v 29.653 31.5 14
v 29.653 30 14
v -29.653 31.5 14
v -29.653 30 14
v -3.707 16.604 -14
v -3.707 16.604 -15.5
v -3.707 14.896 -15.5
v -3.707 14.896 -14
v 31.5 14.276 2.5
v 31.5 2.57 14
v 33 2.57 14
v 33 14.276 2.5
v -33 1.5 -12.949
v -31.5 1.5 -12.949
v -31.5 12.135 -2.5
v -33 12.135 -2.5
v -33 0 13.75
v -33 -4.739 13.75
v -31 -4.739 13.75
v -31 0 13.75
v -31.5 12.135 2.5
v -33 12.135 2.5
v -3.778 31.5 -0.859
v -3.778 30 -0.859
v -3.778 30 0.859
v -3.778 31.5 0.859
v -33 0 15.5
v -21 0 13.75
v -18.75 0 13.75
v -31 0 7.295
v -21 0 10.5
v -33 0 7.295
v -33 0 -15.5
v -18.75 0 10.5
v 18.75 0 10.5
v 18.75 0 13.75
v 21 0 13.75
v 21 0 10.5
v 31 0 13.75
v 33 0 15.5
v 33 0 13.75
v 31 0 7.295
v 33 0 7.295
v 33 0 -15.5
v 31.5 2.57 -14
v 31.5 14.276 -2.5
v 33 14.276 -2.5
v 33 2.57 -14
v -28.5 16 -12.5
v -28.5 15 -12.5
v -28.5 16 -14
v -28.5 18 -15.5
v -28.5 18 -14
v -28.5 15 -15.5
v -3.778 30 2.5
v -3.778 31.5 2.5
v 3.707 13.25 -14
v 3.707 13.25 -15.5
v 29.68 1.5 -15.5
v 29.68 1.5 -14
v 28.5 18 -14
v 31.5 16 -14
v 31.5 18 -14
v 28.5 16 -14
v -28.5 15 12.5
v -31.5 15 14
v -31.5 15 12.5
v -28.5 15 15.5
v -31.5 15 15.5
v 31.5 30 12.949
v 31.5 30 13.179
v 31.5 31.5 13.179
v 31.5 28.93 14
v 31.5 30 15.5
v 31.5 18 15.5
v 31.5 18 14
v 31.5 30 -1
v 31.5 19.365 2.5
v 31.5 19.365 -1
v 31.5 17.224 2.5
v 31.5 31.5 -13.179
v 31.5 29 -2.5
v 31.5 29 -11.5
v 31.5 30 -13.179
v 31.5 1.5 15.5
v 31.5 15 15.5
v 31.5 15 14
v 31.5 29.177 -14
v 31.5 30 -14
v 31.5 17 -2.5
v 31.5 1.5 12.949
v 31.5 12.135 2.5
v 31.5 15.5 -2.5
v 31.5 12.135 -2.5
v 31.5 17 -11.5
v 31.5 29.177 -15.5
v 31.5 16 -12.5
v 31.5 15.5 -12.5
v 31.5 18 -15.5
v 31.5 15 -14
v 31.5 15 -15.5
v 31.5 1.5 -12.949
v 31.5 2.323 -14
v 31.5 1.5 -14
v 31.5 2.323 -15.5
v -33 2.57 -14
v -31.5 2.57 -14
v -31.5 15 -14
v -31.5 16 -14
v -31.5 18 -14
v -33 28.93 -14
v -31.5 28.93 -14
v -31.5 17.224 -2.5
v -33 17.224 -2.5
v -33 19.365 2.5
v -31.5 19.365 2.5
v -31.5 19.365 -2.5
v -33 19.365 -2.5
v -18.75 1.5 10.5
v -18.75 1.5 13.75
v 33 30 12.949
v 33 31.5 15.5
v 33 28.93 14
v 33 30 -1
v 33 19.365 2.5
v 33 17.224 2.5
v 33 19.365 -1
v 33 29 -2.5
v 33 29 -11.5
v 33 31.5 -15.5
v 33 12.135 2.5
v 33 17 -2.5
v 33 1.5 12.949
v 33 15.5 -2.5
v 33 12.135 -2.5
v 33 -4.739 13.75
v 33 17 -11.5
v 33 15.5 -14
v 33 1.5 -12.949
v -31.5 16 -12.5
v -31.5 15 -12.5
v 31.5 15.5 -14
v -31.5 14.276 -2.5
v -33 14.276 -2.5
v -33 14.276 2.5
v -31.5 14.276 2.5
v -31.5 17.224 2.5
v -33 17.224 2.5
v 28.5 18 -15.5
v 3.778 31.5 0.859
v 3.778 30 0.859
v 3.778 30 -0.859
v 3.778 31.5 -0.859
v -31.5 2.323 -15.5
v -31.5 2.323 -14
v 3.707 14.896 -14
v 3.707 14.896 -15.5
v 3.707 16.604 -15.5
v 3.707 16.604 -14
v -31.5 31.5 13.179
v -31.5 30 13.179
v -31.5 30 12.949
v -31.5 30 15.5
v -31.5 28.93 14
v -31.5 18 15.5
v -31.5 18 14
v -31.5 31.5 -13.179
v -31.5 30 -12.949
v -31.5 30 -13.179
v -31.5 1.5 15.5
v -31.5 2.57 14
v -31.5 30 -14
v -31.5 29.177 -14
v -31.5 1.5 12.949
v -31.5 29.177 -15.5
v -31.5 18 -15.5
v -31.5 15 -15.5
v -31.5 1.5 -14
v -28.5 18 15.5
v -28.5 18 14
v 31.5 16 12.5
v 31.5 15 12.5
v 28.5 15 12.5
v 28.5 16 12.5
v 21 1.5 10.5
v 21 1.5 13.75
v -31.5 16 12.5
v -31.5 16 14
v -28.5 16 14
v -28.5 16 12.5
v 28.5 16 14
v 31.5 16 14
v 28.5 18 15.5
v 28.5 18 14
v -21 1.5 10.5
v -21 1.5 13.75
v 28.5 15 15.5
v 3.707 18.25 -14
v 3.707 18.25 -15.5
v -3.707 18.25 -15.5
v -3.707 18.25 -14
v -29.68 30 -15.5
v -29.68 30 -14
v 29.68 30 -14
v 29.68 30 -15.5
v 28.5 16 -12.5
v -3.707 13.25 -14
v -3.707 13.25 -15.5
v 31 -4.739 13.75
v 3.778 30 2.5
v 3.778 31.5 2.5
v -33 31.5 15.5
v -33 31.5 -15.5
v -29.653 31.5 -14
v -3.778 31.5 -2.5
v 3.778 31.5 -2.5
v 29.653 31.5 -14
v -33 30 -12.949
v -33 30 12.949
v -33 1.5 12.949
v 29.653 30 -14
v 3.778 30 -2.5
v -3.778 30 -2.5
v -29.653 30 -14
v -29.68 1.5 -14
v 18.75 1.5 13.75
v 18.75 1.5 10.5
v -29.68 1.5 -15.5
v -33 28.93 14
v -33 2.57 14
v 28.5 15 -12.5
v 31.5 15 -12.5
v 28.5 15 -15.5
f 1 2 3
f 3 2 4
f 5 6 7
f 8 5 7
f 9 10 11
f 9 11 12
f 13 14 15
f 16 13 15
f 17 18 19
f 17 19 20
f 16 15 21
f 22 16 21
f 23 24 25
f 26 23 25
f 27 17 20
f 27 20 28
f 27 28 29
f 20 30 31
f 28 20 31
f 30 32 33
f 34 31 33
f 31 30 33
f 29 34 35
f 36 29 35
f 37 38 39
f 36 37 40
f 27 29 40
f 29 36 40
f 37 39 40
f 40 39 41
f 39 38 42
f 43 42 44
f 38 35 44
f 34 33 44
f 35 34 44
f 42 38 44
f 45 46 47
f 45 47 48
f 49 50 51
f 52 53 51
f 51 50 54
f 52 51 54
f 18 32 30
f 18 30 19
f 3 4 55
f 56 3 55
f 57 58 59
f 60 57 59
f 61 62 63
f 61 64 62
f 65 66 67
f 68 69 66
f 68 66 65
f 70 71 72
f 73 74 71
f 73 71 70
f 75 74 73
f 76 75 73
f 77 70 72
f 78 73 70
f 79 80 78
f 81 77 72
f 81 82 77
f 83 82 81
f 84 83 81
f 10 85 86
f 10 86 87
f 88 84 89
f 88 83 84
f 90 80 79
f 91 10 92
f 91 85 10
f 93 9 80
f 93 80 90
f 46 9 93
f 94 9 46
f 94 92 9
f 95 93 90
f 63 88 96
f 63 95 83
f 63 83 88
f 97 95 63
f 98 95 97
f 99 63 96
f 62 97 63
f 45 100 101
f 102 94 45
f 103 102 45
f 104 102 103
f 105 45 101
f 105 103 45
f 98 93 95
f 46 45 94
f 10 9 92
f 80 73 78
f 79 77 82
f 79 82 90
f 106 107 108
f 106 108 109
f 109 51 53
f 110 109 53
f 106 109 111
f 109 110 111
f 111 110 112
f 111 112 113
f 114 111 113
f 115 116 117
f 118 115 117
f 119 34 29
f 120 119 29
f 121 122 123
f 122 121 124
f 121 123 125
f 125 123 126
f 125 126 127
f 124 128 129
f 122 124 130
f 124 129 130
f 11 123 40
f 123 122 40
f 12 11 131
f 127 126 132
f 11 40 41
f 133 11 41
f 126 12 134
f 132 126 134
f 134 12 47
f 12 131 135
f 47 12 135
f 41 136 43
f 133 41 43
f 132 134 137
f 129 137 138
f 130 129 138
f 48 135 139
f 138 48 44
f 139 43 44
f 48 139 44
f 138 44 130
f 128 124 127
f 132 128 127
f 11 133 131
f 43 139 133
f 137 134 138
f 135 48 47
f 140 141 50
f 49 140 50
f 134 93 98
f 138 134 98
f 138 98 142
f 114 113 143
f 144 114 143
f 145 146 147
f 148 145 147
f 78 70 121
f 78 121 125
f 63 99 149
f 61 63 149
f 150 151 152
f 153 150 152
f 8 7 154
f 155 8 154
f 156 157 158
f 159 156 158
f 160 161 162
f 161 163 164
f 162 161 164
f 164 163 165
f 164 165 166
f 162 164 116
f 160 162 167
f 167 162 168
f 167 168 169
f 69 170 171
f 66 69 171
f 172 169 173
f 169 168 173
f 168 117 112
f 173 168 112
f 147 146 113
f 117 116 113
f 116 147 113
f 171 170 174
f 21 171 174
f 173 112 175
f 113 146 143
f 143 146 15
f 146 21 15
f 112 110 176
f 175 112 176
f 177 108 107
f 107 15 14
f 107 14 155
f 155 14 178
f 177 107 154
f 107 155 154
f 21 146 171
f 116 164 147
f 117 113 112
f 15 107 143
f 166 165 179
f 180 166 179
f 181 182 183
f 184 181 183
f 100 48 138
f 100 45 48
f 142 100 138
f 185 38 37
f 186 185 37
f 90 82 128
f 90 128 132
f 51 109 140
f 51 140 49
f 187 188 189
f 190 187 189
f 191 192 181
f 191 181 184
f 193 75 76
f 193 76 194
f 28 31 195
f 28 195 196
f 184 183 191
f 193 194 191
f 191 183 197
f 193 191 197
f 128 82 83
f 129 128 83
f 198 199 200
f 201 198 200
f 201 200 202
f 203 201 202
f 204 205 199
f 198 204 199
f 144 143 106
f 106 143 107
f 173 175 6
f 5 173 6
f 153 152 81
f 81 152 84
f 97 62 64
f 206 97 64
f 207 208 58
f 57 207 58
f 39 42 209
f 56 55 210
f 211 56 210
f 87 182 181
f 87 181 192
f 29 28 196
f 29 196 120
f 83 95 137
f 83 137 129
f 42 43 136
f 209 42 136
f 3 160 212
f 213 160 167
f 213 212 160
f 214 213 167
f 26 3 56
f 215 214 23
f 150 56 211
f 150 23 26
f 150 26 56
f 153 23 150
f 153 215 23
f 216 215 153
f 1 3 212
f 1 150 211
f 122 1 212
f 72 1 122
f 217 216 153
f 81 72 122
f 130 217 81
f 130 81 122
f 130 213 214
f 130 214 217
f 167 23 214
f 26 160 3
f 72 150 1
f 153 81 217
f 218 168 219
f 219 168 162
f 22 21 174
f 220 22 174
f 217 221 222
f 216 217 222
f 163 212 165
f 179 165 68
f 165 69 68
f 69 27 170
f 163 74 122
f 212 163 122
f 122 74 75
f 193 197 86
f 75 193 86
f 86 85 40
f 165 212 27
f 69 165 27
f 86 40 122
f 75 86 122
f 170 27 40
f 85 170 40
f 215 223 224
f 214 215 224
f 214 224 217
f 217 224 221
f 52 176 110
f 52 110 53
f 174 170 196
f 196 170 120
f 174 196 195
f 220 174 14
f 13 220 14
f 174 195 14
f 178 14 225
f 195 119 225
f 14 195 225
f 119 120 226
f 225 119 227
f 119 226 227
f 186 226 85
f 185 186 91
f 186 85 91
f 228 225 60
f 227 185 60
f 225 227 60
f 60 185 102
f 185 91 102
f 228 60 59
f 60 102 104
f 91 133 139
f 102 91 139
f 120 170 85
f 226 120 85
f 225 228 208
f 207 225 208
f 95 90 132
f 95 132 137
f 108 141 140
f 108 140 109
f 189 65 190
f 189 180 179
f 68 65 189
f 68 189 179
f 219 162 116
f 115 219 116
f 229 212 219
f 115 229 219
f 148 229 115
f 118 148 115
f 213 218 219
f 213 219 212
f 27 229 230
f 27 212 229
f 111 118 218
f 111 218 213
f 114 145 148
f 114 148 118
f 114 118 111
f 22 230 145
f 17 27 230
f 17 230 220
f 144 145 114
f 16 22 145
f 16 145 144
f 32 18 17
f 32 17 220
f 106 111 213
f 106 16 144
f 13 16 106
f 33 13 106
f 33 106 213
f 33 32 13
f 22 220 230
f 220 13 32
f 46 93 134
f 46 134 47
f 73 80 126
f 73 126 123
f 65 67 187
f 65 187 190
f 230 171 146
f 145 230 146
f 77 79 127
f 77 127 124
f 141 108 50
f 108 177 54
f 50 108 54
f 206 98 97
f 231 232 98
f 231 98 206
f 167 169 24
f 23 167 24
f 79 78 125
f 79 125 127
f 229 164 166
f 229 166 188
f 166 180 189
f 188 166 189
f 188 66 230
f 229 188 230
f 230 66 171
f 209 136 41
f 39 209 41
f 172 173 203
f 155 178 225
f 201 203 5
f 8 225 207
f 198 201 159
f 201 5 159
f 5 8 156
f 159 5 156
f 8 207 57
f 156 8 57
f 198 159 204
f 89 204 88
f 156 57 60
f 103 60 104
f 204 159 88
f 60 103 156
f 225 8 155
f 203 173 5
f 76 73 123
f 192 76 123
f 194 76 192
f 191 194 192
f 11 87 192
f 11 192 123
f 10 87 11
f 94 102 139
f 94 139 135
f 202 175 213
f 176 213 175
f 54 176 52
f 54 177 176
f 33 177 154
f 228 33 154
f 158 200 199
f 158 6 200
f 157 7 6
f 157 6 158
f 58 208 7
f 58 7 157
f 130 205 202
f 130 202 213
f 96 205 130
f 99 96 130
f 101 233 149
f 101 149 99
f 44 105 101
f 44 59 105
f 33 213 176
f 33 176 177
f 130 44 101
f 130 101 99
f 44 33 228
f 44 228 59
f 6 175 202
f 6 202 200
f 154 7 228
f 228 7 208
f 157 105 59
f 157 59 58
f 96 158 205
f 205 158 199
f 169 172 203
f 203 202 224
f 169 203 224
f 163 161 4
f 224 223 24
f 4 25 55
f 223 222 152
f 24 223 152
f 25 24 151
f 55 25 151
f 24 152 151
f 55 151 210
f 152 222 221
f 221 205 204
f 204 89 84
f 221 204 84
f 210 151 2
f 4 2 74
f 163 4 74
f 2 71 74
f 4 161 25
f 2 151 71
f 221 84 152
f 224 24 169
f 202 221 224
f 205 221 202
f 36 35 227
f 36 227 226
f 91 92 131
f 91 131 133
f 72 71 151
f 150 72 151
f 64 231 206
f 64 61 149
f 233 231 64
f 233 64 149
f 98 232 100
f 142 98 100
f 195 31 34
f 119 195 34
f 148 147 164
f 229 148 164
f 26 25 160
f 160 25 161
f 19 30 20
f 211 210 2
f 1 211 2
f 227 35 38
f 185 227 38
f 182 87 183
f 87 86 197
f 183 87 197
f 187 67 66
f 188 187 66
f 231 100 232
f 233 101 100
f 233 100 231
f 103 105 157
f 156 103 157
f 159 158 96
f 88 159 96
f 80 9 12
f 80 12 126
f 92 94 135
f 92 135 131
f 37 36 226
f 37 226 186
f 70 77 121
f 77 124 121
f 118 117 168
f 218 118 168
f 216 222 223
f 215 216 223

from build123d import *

# Parameters (mm, degrees)
SKETCH1_W                      = 66
SKETCH1_H                      = 31
BOSS_EXTRUDE1_DEPTH            = 31.5
SHELL1_T                       = -1.5
CUT_EXTRUDE1_REACH             = 57.157
CUT_EXTRUDE2_REACH             = 75.435
CUT_EXTRUDE2_DIRECTION_2_REACH = 75.435
SKETCH6_W                      = 3
SKETCH6_H                      = 1.5
BOSS_EXTRUDE4_DEPTH            = 3
SKETCH6_3_W                    = 3
SKETCH6_3_H                    = 1.5
BOSS_EXTRUDE5_DEPTH            = 1
MIRROR3_COPY_1_SKETCH_W        = 3
MIRROR3_COPY_1_SKETCH_H        = 1.5
MIRROR3_COPY_1_DEPTH           = 3
MIRROR3_COPY_2_SKETCH_W        = 3
MIRROR3_COPY_2_SKETCH_H        = 1.5
MIRROR3_COPY_2_DEPTH           = 1
SKETCH7_W                      = 13
SKETCH7_H                      = 14.5
SKETCH7_W_2                    = 9
SKETCH7_H_2                    = 12
BOSS_EXTRUDE8_DEPTH            = 1.5
SKETCH7_4_W                    = 9
SKETCH7_4_H                    = 12
CUT_EXTRUDE5_DEPTH             = 1.5
CUT_EXTRUDE9_REACH             = 49.215
BOSS_EXTRUDE9_DEPTH            = 2
SKETCH12_W                     = 2.25
SKETCH12_H                     = 3.25
CUT_EXTRUDE10_DEPTH            = 1.5


with BuildPart() as part:
    # Sketch1 → Boss-Extrude1 (new body)
    with BuildSketch(Plane(origin=(0, 0, 0), x_dir=(1, 0, 0), z_dir=(0, 1, 0))):
        Rectangle(SKETCH1_W, SKETCH1_H)
    extrude(amount=BOSS_EXTRUDE1_DEPTH)

    # Shell1
    shell1_openings = [part.faces().sort_by_distance(p)[0] for p in [
        (0, 15.75, 15.5),
    ]]
    offset(amount=SHELL1_T, openings=shell1_openings, kind=Kind.INTERSECTION)

    # Sketch3 → Cut-Extrude1 (cut, up to next)
    with BuildSketch(Plane(origin=(0, 0, -15.5), x_dir=(-1, 0, 0), z_dir=(0, 0, -1)), mode=Mode.PRIVATE) as cut_extrude1_sk1:
        Polygon((29.680353068, 1.5), (3.706668857, 13.25), (-3.706668857, 13.25), (-29.680353068, 1.5), align=None)
    cut_extrude1_tool1 = extrude(cut_extrude1_sk1.sketch, amount=-CUT_EXTRUDE1_REACH, mode=Mode.PRIVATE) & part.part
    # Sketch3 → Cut-Extrude1 (cut, up to next)
    with BuildSketch(Plane(origin=(0, 0, -15.5), x_dir=(-1, 0, 0), z_dir=(0, 0, -1)), mode=Mode.PRIVATE) as cut_extrude1_sk2:
        Polygon((3.706668857, 16.603652775), (3.706668857, 14.896347225), (31.5, 2.323173612), (31.5, 29.176826388), align=None)
    cut_extrude1_tool2 = extrude(cut_extrude1_sk2.sketch, amount=-CUT_EXTRUDE1_REACH, mode=Mode.PRIVATE) & part.part
    # Sketch3 → Cut-Extrude1 (cut, up to next)
    with BuildSketch(Plane(origin=(0, 0, -15.5), x_dir=(-1, 0, 0), z_dir=(0, 0, -1)), mode=Mode.PRIVATE) as cut_extrude1_sk3:
        Polygon((-31.5, 2.323173612), (-3.706668857, 14.896347225), (-3.706668857, 16.603652775), (-31.5, 29.176826388), align=None)
    cut_extrude1_tool3 = extrude(cut_extrude1_sk3.sketch, amount=-CUT_EXTRUDE1_REACH, mode=Mode.PRIVATE) & part.part
    # Sketch3 → Cut-Extrude1 (cut, up to next)
    with BuildSketch(Plane(origin=(0, 0, -15.5), x_dir=(-1, 0, 0), z_dir=(0, 0, -1)), mode=Mode.PRIVATE) as cut_extrude1_sk4:
        Polygon((-3.706668857, 18.25), (3.706668857, 18.25), (29.680353068, 30), (-29.680353068, 30), align=None)
    cut_extrude1_tool4 = extrude(cut_extrude1_sk4.sketch, amount=-CUT_EXTRUDE1_REACH, mode=Mode.PRIVATE) & part.part
    add(cut_extrude1_tool1.solids().sort_by_distance((0, 5.8515, -15.5))[0], mode=Mode.SUBTRACT)
    add(cut_extrude1_tool2.solids().sort_by_distance((-21.68175, 15.75, -15.5))[0], mode=Mode.SUBTRACT)
    add(cut_extrude1_tool3.solids().sort_by_distance((21.68175, 15.75, -15.5))[0], mode=Mode.SUBTRACT)
    add(cut_extrude1_tool4.solids().sort_by_distance((0, 25.6485, -15.5))[0], mode=Mode.SUBTRACT)

    # Sketch4 → Cut-Extrude2 (cut, up to next)
    with BuildSketch(Plane(origin=(-31.5, 0, 0), x_dir=(0, 0, -1), z_dir=(1, 0, 0)), mode=Mode.PRIVATE) as cut_extrude2_sk1:
        Polygon((-2.5, 17.224470603), (-14, 28.929827745), (-14, 2.570172255), (-2.5, 14.275529397), align=None)
    cut_extrude2_tool1 = extrude(cut_extrude2_sk1.sketch, amount=-CUT_EXTRUDE2_REACH, mode=Mode.PRIVATE) & part.part
    # Sketch4 → Cut-Extrude2 (cut, up to next)
    with BuildSketch(Plane(origin=(-31.5, 0, 0), x_dir=(0, 0, -1), z_dir=(1, 0, 0)), mode=Mode.PRIVATE) as cut_extrude2_sk2:
        Polygon((12.948602697, 30), (-12.948602697, 30), (-2.5, 19.364815112), (2.5, 19.364815112), align=None)
    cut_extrude2_tool2 = extrude(cut_extrude2_sk2.sketch, amount=-CUT_EXTRUDE2_REACH, mode=Mode.PRIVATE) & part.part
    # Sketch4 → Cut-Extrude2 (cut, up to next)
    with BuildSketch(Plane(origin=(-31.5, 0, 0), x_dir=(0, 0, -1), z_dir=(1, 0, 0)), mode=Mode.PRIVATE) as cut_extrude2_sk3:
        Polygon((-2.5, 12.135184888), (-12.948602697, 1.5), (12.948602697, 1.5), (2.5, 12.135184888), align=None)
    cut_extrude2_tool3 = extrude(cut_extrude2_sk3.sketch, amount=-CUT_EXTRUDE2_REACH, mode=Mode.PRIVATE) & part.part
    # Sketch4 → Cut-Extrude2 (cut, up to next)
    with BuildSketch(Plane(origin=(-31.5, 0, 0), x_dir=(0, 0, -1), z_dir=(1, 0, 0)), mode=Mode.PRIVATE) as cut_extrude2_sk4:
        Polygon((14, 28.929827745), (2.5, 17.224470603), (2.5, 14.275529397), (14, 2.570172255), align=None)
    cut_extrude2_tool4 = extrude(cut_extrude2_sk4.sketch, amount=-CUT_EXTRUDE2_REACH, mode=Mode.PRIVATE) & part.part
    add(cut_extrude2_tool1.solids().sort_by_distance((-31.5, 15.75, 9.780968))[0], mode=Mode.SUBTRACT)
    add(cut_extrude2_tool2.solids().sort_by_distance((-31.5, 25.881252, 0))[0], mode=Mode.SUBTRACT)
    add(cut_extrude2_tool3.solids().sort_by_distance((-31.5, 5.618748, 0))[0], mode=Mode.SUBTRACT)
    add(cut_extrude2_tool4.solids().sort_by_distance((-31.5, 15.75, -9.780968))[0], mode=Mode.SUBTRACT)

    # Sketch4 → Cut-Extrude2 direction 2 (cut, up to next)
    with BuildSketch(Plane(origin=(-31.5, 0, 0), x_dir=(0, 0, -1), z_dir=(1, 0, 0)), mode=Mode.PRIVATE) as cut_extrude2_direction_2_sk1:
        Polygon((-2.5, 17.224470603), (-14, 28.929827745), (-14, 2.570172255), (-2.5, 14.275529397), align=None)
    cut_extrude2_direction_2_tool1 = extrude(cut_extrude2_direction_2_sk1.sketch, amount=CUT_EXTRUDE2_DIRECTION_2_REACH, mode=Mode.PRIVATE) & part.part
    # Sketch4 → Cut-Extrude2 direction 2 (cut, up to next)
    with BuildSketch(Plane(origin=(-31.5, 0, 0), x_dir=(0, 0, -1), z_dir=(1, 0, 0)), mode=Mode.PRIVATE) as cut_extrude2_direction_2_sk2:
        Polygon((12.948602697, 30), (-12.948602697, 30), (-2.5, 19.364815112), (2.5, 19.364815112), align=None)
    cut_extrude2_direction_2_tool2 = extrude(cut_extrude2_direction_2_sk2.sketch, amount=CUT_EXTRUDE2_DIRECTION_2_REACH, mode=Mode.PRIVATE) & part.part
    # Sketch4 → Cut-Extrude2 direction 2 (cut, up to next)
    with BuildSketch(Plane(origin=(-31.5, 0, 0), x_dir=(0, 0, -1), z_dir=(1, 0, 0)), mode=Mode.PRIVATE) as cut_extrude2_direction_2_sk3:
        Polygon((-2.5, 12.135184888), (-12.948602697, 1.5), (12.948602697, 1.5), (2.5, 12.135184888), align=None)
    cut_extrude2_direction_2_tool3 = extrude(cut_extrude2_direction_2_sk3.sketch, amount=CUT_EXTRUDE2_DIRECTION_2_REACH, mode=Mode.PRIVATE) & part.part
    # Sketch4 → Cut-Extrude2 direction 2 (cut, up to next)
    with BuildSketch(Plane(origin=(-31.5, 0, 0), x_dir=(0, 0, -1), z_dir=(1, 0, 0)), mode=Mode.PRIVATE) as cut_extrude2_direction_2_sk4:
        Polygon((14, 28.929827745), (2.5, 17.224470603), (2.5, 14.275529397), (14, 2.570172255), align=None)
    cut_extrude2_direction_2_tool4 = extrude(cut_extrude2_direction_2_sk4.sketch, amount=CUT_EXTRUDE2_DIRECTION_2_REACH, mode=Mode.PRIVATE) & part.part
    add(cut_extrude2_direction_2_tool1.solids().sort_by_distance((-31.5, 15.75, 9.780968))[0], mode=Mode.SUBTRACT)
    add(cut_extrude2_direction_2_tool2.solids().sort_by_distance((-31.5, 25.881252, 0))[0], mode=Mode.SUBTRACT)
    add(cut_extrude2_direction_2_tool3.solids().sort_by_distance((-31.5, 5.618748, 0))[0], mode=Mode.SUBTRACT)
    add(cut_extrude2_direction_2_tool4.solids().sort_by_distance((-31.5, 15.75, -9.780968))[0], mode=Mode.SUBTRACT)

    # Sketch6 → Boss-Extrude4 (add)
    with BuildSketch(Plane(origin=(0, 15, 0), x_dir=(-1, 0, 0), z_dir=(0, -1, 0))):
        with Locations((-30, 14.75)):
            Rectangle(SKETCH6_W, SKETCH6_H)
    boss_extrude4 = extrude(amount=-BOSS_EXTRUDE4_DEPTH)

    # Sketch6<3> → Boss-Extrude5 (add)
    with BuildSketch(Plane(origin=(0, 15, 0), x_dir=(-1, 0, 0), z_dir=(0, -1, 0))):
        with Locations((-30, 13.25)):
            Rectangle(SKETCH6_3_W, SKETCH6_3_H)
    boss_extrude5 = extrude(amount=-BOSS_EXTRUDE5_DEPTH)

    # Mirror2: Boss-Extrude4, Boss-Extrude5 across plane
    add(boss_extrude4.mirror(Plane.XY))
    add(boss_extrude5.mirror(Plane.XY))

    # Mirror3: Boss-Extrude4, Boss-Extrude5 across plane
    add(boss_extrude4.mirror(Plane.ZY))
    add(boss_extrude5.mirror(Plane.ZY))

    # Mirror3 copy 1 sketch → Mirror3 copy 1 (add)
    with BuildSketch(Plane.XZ.offset(-15)):
        with Locations((-30, 14.75)):
            Rectangle(MIRROR3_COPY_1_SKETCH_W, MIRROR3_COPY_1_SKETCH_H)
    extrude(amount=-MIRROR3_COPY_1_DEPTH)

    # Mirror3 copy 2 sketch → Mirror3 copy 2 (add)
    with BuildSketch(Plane.XZ.offset(-15)):
        with Locations((-30, 13.25)):
            Rectangle(MIRROR3_COPY_2_SKETCH_W, MIRROR3_COPY_2_SKETCH_H)
    extrude(amount=-MIRROR3_COPY_2_DEPTH)

    # Sketch7 → Boss-Extrude8 (add)
    with BuildSketch(Plane(origin=(31.5, 0, 0), x_dir=(0, 0, -1), z_dir=(1, 0, 0))):
        with Locations((7.5, 22.75)):
            Rectangle(SKETCH7_W, SKETCH7_H)
        with Locations((7, 23)):
            Rectangle(SKETCH7_W_2, SKETCH7_H_2, mode=Mode.SUBTRACT)
    extrude(amount=BOSS_EXTRUDE8_DEPTH)

    # Sketch7<4> → Cut-Extrude5 (cut)
    with BuildSketch(Plane(origin=(31.5, 0, 0), x_dir=(0, 0, -1), z_dir=(1, 0, 0))):
        with Locations((7, 23)):
            Rectangle(SKETCH7_4_W, SKETCH7_4_H)
    extrude(amount=CUT_EXTRUDE5_DEPTH, mode=Mode.SUBTRACT)

    # Sketch10 → Cut-Extrude9 (cut, up to next)
    with BuildSketch(Plane.XZ.offset(-30), mode=Mode.PRIVATE) as cut_extrude9_sk1:
        Polygon((-31.5, -13.17926185), (-3.778339162, -0.8585237), (-3.778339162, 0.8585237), (-31.5, 13.17926185), (-31.5, 12.948602697), (-31.5, -12.948602697), align=None)
    cut_extrude9_tool1 = extrude(cut_extrude9_sk1.sketch, amount=-CUT_EXTRUDE9_REACH, mode=Mode.PRIVATE) & part.part
    # Sketch10 → Cut-Extrude9 (cut, up to next)
    with BuildSketch(Plane.XZ.offset(-30), mode=Mode.PRIVATE) as cut_extrude9_sk2:
        Polygon((-3.778339162, 2.5), (3.778339162, 2.5), (29.653339162, 14), (-29.653339162, 14), align=None)
    cut_extrude9_tool2 = extrude(cut_extrude9_sk2.sketch, amount=-CUT_EXTRUDE9_REACH, mode=Mode.PRIVATE) & part.part
    # Sketch10 → Cut-Extrude9 (cut, up to next)
    with BuildSketch(Plane.XZ.offset(-30), mode=Mode.PRIVATE) as cut_extrude9_sk3:
        Polygon((3.778339162, 0.8585237), (3.778339162, -0.8585237), (31.5, -13.17926185), (31.5, -1), (31.5, 12.948602697), (31.5, 13.17926185), align=None)
    cut_extrude9_tool3 = extrude(cut_extrude9_sk3.sketch, amount=-CUT_EXTRUDE9_REACH, mode=Mode.PRIVATE) & part.part
    # Sketch10 → Cut-Extrude9 (cut, up to next)
    with BuildSketch(Plane.XZ.offset(-30), mode=Mode.PRIVATE) as cut_extrude9_sk4:
        Polygon((29.653339162, -14), (3.778339162, -2.5), (-3.778339162, -2.5), (-29.653339162, -14), align=None)
    cut_extrude9_tool4 = extrude(cut_extrude9_sk4.sketch, amount=-CUT_EXTRUDE9_REACH, mode=Mode.PRIVATE) & part.part
    add(cut_extrude9_tool1.solids().sort_by_distance((-21.694312, 30, 0))[0], mode=Mode.SUBTRACT)
    add(cut_extrude9_tool2.solids().sort_by_distance((0, 30, 9.733436))[0], mode=Mode.SUBTRACT)
    add(cut_extrude9_tool3.solids().sort_by_distance((21.694312, 30, 0))[0], mode=Mode.SUBTRACT)
    add(cut_extrude9_tool4.solids().sort_by_distance((0, 30, -9.733436))[0], mode=Mode.SUBTRACT)

    # Sketch11 → Boss-Extrude9 (add)
    with BuildSketch(Plane.ZY.offset(33)):
        Polygon((13.75, 0), (7.294759025, 0), (13.75, -4.738684311), align=None)
    boss_extrude9 = extrude(amount=-BOSS_EXTRUDE9_DEPTH)

    # Mirror5: Boss-Extrude9 across plane
    add(boss_extrude9.mirror(Plane.ZY))

    # Sketch12 → Cut-Extrude10 (cut)
    with BuildSketch(Plane.XZ):
        with Locations((-19.875, 12.125)):
            Rectangle(SKETCH12_W, SKETCH12_H)
        with Locations((19.875, 12.125)):
            Rectangle(SKETCH12_W, SKETCH12_H)
    extrude(amount=-CUT_EXTRUDE10_DEPTH, mode=Mode.SUBTRACT)


solid = part.part
